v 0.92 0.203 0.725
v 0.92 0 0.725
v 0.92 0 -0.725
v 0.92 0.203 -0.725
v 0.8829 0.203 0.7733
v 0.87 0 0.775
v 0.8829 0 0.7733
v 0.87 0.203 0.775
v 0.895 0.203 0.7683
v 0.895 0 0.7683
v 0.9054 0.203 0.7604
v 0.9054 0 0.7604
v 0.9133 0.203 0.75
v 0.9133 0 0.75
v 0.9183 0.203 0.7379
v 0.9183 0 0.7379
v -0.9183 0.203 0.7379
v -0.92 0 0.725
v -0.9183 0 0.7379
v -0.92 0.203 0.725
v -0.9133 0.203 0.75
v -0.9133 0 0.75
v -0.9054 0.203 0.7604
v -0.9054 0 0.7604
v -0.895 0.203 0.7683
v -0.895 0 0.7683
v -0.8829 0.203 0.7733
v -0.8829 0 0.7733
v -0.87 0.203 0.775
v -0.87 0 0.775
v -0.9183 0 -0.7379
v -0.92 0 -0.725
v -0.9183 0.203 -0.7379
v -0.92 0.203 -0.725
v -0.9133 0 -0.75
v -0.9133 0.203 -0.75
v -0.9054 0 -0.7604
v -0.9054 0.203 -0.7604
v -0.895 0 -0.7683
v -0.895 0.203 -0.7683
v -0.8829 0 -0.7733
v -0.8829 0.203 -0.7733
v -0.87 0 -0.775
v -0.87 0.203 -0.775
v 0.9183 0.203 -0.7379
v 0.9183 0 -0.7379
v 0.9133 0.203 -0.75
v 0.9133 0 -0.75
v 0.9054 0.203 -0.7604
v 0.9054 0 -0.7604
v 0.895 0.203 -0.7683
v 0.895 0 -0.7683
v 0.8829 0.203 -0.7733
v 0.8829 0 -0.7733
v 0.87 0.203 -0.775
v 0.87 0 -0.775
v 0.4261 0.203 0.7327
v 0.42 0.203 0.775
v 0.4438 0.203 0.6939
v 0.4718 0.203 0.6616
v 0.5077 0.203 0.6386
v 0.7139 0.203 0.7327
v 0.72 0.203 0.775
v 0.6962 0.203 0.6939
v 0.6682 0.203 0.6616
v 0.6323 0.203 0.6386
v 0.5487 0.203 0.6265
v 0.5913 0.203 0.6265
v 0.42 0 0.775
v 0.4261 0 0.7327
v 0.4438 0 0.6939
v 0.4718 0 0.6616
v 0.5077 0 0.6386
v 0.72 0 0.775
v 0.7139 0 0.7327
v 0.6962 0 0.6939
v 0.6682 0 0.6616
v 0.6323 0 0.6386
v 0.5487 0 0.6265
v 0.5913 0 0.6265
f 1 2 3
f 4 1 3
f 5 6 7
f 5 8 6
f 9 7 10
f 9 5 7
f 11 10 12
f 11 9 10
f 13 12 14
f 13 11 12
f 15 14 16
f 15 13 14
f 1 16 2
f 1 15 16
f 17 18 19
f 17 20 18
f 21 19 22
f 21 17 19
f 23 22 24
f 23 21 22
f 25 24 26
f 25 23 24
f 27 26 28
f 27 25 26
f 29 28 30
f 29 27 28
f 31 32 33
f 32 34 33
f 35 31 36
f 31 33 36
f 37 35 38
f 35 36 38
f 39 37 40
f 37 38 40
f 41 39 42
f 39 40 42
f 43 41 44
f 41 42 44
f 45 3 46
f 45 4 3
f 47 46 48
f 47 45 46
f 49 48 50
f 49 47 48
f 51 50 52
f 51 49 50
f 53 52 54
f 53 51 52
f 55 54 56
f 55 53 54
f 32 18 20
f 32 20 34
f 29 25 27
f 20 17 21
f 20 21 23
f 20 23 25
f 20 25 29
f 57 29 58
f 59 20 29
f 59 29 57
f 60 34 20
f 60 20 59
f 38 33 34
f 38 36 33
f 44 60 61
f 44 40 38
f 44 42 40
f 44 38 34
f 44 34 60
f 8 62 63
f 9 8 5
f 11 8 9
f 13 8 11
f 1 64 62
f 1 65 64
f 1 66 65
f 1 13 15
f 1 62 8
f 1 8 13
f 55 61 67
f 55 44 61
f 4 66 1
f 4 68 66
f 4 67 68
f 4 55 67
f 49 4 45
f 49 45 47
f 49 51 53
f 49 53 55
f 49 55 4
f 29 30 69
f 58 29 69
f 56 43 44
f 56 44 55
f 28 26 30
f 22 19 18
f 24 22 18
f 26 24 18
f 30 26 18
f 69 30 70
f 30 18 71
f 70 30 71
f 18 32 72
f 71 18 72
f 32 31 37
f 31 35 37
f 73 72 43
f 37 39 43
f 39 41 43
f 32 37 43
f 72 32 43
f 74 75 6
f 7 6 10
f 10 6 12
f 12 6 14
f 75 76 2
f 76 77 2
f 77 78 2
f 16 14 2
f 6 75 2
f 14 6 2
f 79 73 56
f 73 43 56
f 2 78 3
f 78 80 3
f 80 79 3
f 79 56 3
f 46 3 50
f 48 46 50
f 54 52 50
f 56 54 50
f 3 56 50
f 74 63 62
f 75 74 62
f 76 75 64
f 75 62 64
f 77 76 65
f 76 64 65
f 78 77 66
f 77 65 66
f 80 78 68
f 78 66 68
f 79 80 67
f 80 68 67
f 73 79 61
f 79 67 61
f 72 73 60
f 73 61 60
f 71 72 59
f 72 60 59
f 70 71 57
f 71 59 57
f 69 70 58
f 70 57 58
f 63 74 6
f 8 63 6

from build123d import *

# Parameters (mm, degrees)
SKETCH1_W           = 1.84
SKETCH1_H           = 1.55
BOSS_EXTRUDE1_DEPTH = 0.203
FILLET1_R           = 0.05
SKETCH2_R           = 0.15
CUT_EXTRUDE1_DEPTH  = 1.203


with BuildPart() as part:
    # Sketch1 → Boss-Extrude1 (new body)
    with BuildSketch(Plane(origin=(0, 0, 0), x_dir=(1, 0, 0), z_dir=(0, 1, 0))):
        Rectangle(SKETCH1_W, SKETCH1_H)
    extrude(amount=BOSS_EXTRUDE1_DEPTH)

    # Fillet1
    fillet1_edges = [part.edges().sort_by_distance(p)[0] for p in [
        (0.92, 0.1015, 0.775),
        (-0.92, 0.1015, 0.775),
        (-0.92, 0.1015, -0.775),
        (0.92, 0.1015, -0.775),
    ]]
    fillet(fillet1_edges, radius=FILLET1_R)

    # Sketch2 → Cut-Extrude1 (cut, through all)
    with BuildSketch(Plane(origin=(0, 0.203, 0), x_dir=(1, 0, 0), z_dir=(0, 1, 0))):
        with Locations((0.57, -0.775)):
            Circle(SKETCH2_R)
    extrude(amount=-CUT_EXTRUDE1_DEPTH, mode=Mode.SUBTRACT)


solid = part.part
